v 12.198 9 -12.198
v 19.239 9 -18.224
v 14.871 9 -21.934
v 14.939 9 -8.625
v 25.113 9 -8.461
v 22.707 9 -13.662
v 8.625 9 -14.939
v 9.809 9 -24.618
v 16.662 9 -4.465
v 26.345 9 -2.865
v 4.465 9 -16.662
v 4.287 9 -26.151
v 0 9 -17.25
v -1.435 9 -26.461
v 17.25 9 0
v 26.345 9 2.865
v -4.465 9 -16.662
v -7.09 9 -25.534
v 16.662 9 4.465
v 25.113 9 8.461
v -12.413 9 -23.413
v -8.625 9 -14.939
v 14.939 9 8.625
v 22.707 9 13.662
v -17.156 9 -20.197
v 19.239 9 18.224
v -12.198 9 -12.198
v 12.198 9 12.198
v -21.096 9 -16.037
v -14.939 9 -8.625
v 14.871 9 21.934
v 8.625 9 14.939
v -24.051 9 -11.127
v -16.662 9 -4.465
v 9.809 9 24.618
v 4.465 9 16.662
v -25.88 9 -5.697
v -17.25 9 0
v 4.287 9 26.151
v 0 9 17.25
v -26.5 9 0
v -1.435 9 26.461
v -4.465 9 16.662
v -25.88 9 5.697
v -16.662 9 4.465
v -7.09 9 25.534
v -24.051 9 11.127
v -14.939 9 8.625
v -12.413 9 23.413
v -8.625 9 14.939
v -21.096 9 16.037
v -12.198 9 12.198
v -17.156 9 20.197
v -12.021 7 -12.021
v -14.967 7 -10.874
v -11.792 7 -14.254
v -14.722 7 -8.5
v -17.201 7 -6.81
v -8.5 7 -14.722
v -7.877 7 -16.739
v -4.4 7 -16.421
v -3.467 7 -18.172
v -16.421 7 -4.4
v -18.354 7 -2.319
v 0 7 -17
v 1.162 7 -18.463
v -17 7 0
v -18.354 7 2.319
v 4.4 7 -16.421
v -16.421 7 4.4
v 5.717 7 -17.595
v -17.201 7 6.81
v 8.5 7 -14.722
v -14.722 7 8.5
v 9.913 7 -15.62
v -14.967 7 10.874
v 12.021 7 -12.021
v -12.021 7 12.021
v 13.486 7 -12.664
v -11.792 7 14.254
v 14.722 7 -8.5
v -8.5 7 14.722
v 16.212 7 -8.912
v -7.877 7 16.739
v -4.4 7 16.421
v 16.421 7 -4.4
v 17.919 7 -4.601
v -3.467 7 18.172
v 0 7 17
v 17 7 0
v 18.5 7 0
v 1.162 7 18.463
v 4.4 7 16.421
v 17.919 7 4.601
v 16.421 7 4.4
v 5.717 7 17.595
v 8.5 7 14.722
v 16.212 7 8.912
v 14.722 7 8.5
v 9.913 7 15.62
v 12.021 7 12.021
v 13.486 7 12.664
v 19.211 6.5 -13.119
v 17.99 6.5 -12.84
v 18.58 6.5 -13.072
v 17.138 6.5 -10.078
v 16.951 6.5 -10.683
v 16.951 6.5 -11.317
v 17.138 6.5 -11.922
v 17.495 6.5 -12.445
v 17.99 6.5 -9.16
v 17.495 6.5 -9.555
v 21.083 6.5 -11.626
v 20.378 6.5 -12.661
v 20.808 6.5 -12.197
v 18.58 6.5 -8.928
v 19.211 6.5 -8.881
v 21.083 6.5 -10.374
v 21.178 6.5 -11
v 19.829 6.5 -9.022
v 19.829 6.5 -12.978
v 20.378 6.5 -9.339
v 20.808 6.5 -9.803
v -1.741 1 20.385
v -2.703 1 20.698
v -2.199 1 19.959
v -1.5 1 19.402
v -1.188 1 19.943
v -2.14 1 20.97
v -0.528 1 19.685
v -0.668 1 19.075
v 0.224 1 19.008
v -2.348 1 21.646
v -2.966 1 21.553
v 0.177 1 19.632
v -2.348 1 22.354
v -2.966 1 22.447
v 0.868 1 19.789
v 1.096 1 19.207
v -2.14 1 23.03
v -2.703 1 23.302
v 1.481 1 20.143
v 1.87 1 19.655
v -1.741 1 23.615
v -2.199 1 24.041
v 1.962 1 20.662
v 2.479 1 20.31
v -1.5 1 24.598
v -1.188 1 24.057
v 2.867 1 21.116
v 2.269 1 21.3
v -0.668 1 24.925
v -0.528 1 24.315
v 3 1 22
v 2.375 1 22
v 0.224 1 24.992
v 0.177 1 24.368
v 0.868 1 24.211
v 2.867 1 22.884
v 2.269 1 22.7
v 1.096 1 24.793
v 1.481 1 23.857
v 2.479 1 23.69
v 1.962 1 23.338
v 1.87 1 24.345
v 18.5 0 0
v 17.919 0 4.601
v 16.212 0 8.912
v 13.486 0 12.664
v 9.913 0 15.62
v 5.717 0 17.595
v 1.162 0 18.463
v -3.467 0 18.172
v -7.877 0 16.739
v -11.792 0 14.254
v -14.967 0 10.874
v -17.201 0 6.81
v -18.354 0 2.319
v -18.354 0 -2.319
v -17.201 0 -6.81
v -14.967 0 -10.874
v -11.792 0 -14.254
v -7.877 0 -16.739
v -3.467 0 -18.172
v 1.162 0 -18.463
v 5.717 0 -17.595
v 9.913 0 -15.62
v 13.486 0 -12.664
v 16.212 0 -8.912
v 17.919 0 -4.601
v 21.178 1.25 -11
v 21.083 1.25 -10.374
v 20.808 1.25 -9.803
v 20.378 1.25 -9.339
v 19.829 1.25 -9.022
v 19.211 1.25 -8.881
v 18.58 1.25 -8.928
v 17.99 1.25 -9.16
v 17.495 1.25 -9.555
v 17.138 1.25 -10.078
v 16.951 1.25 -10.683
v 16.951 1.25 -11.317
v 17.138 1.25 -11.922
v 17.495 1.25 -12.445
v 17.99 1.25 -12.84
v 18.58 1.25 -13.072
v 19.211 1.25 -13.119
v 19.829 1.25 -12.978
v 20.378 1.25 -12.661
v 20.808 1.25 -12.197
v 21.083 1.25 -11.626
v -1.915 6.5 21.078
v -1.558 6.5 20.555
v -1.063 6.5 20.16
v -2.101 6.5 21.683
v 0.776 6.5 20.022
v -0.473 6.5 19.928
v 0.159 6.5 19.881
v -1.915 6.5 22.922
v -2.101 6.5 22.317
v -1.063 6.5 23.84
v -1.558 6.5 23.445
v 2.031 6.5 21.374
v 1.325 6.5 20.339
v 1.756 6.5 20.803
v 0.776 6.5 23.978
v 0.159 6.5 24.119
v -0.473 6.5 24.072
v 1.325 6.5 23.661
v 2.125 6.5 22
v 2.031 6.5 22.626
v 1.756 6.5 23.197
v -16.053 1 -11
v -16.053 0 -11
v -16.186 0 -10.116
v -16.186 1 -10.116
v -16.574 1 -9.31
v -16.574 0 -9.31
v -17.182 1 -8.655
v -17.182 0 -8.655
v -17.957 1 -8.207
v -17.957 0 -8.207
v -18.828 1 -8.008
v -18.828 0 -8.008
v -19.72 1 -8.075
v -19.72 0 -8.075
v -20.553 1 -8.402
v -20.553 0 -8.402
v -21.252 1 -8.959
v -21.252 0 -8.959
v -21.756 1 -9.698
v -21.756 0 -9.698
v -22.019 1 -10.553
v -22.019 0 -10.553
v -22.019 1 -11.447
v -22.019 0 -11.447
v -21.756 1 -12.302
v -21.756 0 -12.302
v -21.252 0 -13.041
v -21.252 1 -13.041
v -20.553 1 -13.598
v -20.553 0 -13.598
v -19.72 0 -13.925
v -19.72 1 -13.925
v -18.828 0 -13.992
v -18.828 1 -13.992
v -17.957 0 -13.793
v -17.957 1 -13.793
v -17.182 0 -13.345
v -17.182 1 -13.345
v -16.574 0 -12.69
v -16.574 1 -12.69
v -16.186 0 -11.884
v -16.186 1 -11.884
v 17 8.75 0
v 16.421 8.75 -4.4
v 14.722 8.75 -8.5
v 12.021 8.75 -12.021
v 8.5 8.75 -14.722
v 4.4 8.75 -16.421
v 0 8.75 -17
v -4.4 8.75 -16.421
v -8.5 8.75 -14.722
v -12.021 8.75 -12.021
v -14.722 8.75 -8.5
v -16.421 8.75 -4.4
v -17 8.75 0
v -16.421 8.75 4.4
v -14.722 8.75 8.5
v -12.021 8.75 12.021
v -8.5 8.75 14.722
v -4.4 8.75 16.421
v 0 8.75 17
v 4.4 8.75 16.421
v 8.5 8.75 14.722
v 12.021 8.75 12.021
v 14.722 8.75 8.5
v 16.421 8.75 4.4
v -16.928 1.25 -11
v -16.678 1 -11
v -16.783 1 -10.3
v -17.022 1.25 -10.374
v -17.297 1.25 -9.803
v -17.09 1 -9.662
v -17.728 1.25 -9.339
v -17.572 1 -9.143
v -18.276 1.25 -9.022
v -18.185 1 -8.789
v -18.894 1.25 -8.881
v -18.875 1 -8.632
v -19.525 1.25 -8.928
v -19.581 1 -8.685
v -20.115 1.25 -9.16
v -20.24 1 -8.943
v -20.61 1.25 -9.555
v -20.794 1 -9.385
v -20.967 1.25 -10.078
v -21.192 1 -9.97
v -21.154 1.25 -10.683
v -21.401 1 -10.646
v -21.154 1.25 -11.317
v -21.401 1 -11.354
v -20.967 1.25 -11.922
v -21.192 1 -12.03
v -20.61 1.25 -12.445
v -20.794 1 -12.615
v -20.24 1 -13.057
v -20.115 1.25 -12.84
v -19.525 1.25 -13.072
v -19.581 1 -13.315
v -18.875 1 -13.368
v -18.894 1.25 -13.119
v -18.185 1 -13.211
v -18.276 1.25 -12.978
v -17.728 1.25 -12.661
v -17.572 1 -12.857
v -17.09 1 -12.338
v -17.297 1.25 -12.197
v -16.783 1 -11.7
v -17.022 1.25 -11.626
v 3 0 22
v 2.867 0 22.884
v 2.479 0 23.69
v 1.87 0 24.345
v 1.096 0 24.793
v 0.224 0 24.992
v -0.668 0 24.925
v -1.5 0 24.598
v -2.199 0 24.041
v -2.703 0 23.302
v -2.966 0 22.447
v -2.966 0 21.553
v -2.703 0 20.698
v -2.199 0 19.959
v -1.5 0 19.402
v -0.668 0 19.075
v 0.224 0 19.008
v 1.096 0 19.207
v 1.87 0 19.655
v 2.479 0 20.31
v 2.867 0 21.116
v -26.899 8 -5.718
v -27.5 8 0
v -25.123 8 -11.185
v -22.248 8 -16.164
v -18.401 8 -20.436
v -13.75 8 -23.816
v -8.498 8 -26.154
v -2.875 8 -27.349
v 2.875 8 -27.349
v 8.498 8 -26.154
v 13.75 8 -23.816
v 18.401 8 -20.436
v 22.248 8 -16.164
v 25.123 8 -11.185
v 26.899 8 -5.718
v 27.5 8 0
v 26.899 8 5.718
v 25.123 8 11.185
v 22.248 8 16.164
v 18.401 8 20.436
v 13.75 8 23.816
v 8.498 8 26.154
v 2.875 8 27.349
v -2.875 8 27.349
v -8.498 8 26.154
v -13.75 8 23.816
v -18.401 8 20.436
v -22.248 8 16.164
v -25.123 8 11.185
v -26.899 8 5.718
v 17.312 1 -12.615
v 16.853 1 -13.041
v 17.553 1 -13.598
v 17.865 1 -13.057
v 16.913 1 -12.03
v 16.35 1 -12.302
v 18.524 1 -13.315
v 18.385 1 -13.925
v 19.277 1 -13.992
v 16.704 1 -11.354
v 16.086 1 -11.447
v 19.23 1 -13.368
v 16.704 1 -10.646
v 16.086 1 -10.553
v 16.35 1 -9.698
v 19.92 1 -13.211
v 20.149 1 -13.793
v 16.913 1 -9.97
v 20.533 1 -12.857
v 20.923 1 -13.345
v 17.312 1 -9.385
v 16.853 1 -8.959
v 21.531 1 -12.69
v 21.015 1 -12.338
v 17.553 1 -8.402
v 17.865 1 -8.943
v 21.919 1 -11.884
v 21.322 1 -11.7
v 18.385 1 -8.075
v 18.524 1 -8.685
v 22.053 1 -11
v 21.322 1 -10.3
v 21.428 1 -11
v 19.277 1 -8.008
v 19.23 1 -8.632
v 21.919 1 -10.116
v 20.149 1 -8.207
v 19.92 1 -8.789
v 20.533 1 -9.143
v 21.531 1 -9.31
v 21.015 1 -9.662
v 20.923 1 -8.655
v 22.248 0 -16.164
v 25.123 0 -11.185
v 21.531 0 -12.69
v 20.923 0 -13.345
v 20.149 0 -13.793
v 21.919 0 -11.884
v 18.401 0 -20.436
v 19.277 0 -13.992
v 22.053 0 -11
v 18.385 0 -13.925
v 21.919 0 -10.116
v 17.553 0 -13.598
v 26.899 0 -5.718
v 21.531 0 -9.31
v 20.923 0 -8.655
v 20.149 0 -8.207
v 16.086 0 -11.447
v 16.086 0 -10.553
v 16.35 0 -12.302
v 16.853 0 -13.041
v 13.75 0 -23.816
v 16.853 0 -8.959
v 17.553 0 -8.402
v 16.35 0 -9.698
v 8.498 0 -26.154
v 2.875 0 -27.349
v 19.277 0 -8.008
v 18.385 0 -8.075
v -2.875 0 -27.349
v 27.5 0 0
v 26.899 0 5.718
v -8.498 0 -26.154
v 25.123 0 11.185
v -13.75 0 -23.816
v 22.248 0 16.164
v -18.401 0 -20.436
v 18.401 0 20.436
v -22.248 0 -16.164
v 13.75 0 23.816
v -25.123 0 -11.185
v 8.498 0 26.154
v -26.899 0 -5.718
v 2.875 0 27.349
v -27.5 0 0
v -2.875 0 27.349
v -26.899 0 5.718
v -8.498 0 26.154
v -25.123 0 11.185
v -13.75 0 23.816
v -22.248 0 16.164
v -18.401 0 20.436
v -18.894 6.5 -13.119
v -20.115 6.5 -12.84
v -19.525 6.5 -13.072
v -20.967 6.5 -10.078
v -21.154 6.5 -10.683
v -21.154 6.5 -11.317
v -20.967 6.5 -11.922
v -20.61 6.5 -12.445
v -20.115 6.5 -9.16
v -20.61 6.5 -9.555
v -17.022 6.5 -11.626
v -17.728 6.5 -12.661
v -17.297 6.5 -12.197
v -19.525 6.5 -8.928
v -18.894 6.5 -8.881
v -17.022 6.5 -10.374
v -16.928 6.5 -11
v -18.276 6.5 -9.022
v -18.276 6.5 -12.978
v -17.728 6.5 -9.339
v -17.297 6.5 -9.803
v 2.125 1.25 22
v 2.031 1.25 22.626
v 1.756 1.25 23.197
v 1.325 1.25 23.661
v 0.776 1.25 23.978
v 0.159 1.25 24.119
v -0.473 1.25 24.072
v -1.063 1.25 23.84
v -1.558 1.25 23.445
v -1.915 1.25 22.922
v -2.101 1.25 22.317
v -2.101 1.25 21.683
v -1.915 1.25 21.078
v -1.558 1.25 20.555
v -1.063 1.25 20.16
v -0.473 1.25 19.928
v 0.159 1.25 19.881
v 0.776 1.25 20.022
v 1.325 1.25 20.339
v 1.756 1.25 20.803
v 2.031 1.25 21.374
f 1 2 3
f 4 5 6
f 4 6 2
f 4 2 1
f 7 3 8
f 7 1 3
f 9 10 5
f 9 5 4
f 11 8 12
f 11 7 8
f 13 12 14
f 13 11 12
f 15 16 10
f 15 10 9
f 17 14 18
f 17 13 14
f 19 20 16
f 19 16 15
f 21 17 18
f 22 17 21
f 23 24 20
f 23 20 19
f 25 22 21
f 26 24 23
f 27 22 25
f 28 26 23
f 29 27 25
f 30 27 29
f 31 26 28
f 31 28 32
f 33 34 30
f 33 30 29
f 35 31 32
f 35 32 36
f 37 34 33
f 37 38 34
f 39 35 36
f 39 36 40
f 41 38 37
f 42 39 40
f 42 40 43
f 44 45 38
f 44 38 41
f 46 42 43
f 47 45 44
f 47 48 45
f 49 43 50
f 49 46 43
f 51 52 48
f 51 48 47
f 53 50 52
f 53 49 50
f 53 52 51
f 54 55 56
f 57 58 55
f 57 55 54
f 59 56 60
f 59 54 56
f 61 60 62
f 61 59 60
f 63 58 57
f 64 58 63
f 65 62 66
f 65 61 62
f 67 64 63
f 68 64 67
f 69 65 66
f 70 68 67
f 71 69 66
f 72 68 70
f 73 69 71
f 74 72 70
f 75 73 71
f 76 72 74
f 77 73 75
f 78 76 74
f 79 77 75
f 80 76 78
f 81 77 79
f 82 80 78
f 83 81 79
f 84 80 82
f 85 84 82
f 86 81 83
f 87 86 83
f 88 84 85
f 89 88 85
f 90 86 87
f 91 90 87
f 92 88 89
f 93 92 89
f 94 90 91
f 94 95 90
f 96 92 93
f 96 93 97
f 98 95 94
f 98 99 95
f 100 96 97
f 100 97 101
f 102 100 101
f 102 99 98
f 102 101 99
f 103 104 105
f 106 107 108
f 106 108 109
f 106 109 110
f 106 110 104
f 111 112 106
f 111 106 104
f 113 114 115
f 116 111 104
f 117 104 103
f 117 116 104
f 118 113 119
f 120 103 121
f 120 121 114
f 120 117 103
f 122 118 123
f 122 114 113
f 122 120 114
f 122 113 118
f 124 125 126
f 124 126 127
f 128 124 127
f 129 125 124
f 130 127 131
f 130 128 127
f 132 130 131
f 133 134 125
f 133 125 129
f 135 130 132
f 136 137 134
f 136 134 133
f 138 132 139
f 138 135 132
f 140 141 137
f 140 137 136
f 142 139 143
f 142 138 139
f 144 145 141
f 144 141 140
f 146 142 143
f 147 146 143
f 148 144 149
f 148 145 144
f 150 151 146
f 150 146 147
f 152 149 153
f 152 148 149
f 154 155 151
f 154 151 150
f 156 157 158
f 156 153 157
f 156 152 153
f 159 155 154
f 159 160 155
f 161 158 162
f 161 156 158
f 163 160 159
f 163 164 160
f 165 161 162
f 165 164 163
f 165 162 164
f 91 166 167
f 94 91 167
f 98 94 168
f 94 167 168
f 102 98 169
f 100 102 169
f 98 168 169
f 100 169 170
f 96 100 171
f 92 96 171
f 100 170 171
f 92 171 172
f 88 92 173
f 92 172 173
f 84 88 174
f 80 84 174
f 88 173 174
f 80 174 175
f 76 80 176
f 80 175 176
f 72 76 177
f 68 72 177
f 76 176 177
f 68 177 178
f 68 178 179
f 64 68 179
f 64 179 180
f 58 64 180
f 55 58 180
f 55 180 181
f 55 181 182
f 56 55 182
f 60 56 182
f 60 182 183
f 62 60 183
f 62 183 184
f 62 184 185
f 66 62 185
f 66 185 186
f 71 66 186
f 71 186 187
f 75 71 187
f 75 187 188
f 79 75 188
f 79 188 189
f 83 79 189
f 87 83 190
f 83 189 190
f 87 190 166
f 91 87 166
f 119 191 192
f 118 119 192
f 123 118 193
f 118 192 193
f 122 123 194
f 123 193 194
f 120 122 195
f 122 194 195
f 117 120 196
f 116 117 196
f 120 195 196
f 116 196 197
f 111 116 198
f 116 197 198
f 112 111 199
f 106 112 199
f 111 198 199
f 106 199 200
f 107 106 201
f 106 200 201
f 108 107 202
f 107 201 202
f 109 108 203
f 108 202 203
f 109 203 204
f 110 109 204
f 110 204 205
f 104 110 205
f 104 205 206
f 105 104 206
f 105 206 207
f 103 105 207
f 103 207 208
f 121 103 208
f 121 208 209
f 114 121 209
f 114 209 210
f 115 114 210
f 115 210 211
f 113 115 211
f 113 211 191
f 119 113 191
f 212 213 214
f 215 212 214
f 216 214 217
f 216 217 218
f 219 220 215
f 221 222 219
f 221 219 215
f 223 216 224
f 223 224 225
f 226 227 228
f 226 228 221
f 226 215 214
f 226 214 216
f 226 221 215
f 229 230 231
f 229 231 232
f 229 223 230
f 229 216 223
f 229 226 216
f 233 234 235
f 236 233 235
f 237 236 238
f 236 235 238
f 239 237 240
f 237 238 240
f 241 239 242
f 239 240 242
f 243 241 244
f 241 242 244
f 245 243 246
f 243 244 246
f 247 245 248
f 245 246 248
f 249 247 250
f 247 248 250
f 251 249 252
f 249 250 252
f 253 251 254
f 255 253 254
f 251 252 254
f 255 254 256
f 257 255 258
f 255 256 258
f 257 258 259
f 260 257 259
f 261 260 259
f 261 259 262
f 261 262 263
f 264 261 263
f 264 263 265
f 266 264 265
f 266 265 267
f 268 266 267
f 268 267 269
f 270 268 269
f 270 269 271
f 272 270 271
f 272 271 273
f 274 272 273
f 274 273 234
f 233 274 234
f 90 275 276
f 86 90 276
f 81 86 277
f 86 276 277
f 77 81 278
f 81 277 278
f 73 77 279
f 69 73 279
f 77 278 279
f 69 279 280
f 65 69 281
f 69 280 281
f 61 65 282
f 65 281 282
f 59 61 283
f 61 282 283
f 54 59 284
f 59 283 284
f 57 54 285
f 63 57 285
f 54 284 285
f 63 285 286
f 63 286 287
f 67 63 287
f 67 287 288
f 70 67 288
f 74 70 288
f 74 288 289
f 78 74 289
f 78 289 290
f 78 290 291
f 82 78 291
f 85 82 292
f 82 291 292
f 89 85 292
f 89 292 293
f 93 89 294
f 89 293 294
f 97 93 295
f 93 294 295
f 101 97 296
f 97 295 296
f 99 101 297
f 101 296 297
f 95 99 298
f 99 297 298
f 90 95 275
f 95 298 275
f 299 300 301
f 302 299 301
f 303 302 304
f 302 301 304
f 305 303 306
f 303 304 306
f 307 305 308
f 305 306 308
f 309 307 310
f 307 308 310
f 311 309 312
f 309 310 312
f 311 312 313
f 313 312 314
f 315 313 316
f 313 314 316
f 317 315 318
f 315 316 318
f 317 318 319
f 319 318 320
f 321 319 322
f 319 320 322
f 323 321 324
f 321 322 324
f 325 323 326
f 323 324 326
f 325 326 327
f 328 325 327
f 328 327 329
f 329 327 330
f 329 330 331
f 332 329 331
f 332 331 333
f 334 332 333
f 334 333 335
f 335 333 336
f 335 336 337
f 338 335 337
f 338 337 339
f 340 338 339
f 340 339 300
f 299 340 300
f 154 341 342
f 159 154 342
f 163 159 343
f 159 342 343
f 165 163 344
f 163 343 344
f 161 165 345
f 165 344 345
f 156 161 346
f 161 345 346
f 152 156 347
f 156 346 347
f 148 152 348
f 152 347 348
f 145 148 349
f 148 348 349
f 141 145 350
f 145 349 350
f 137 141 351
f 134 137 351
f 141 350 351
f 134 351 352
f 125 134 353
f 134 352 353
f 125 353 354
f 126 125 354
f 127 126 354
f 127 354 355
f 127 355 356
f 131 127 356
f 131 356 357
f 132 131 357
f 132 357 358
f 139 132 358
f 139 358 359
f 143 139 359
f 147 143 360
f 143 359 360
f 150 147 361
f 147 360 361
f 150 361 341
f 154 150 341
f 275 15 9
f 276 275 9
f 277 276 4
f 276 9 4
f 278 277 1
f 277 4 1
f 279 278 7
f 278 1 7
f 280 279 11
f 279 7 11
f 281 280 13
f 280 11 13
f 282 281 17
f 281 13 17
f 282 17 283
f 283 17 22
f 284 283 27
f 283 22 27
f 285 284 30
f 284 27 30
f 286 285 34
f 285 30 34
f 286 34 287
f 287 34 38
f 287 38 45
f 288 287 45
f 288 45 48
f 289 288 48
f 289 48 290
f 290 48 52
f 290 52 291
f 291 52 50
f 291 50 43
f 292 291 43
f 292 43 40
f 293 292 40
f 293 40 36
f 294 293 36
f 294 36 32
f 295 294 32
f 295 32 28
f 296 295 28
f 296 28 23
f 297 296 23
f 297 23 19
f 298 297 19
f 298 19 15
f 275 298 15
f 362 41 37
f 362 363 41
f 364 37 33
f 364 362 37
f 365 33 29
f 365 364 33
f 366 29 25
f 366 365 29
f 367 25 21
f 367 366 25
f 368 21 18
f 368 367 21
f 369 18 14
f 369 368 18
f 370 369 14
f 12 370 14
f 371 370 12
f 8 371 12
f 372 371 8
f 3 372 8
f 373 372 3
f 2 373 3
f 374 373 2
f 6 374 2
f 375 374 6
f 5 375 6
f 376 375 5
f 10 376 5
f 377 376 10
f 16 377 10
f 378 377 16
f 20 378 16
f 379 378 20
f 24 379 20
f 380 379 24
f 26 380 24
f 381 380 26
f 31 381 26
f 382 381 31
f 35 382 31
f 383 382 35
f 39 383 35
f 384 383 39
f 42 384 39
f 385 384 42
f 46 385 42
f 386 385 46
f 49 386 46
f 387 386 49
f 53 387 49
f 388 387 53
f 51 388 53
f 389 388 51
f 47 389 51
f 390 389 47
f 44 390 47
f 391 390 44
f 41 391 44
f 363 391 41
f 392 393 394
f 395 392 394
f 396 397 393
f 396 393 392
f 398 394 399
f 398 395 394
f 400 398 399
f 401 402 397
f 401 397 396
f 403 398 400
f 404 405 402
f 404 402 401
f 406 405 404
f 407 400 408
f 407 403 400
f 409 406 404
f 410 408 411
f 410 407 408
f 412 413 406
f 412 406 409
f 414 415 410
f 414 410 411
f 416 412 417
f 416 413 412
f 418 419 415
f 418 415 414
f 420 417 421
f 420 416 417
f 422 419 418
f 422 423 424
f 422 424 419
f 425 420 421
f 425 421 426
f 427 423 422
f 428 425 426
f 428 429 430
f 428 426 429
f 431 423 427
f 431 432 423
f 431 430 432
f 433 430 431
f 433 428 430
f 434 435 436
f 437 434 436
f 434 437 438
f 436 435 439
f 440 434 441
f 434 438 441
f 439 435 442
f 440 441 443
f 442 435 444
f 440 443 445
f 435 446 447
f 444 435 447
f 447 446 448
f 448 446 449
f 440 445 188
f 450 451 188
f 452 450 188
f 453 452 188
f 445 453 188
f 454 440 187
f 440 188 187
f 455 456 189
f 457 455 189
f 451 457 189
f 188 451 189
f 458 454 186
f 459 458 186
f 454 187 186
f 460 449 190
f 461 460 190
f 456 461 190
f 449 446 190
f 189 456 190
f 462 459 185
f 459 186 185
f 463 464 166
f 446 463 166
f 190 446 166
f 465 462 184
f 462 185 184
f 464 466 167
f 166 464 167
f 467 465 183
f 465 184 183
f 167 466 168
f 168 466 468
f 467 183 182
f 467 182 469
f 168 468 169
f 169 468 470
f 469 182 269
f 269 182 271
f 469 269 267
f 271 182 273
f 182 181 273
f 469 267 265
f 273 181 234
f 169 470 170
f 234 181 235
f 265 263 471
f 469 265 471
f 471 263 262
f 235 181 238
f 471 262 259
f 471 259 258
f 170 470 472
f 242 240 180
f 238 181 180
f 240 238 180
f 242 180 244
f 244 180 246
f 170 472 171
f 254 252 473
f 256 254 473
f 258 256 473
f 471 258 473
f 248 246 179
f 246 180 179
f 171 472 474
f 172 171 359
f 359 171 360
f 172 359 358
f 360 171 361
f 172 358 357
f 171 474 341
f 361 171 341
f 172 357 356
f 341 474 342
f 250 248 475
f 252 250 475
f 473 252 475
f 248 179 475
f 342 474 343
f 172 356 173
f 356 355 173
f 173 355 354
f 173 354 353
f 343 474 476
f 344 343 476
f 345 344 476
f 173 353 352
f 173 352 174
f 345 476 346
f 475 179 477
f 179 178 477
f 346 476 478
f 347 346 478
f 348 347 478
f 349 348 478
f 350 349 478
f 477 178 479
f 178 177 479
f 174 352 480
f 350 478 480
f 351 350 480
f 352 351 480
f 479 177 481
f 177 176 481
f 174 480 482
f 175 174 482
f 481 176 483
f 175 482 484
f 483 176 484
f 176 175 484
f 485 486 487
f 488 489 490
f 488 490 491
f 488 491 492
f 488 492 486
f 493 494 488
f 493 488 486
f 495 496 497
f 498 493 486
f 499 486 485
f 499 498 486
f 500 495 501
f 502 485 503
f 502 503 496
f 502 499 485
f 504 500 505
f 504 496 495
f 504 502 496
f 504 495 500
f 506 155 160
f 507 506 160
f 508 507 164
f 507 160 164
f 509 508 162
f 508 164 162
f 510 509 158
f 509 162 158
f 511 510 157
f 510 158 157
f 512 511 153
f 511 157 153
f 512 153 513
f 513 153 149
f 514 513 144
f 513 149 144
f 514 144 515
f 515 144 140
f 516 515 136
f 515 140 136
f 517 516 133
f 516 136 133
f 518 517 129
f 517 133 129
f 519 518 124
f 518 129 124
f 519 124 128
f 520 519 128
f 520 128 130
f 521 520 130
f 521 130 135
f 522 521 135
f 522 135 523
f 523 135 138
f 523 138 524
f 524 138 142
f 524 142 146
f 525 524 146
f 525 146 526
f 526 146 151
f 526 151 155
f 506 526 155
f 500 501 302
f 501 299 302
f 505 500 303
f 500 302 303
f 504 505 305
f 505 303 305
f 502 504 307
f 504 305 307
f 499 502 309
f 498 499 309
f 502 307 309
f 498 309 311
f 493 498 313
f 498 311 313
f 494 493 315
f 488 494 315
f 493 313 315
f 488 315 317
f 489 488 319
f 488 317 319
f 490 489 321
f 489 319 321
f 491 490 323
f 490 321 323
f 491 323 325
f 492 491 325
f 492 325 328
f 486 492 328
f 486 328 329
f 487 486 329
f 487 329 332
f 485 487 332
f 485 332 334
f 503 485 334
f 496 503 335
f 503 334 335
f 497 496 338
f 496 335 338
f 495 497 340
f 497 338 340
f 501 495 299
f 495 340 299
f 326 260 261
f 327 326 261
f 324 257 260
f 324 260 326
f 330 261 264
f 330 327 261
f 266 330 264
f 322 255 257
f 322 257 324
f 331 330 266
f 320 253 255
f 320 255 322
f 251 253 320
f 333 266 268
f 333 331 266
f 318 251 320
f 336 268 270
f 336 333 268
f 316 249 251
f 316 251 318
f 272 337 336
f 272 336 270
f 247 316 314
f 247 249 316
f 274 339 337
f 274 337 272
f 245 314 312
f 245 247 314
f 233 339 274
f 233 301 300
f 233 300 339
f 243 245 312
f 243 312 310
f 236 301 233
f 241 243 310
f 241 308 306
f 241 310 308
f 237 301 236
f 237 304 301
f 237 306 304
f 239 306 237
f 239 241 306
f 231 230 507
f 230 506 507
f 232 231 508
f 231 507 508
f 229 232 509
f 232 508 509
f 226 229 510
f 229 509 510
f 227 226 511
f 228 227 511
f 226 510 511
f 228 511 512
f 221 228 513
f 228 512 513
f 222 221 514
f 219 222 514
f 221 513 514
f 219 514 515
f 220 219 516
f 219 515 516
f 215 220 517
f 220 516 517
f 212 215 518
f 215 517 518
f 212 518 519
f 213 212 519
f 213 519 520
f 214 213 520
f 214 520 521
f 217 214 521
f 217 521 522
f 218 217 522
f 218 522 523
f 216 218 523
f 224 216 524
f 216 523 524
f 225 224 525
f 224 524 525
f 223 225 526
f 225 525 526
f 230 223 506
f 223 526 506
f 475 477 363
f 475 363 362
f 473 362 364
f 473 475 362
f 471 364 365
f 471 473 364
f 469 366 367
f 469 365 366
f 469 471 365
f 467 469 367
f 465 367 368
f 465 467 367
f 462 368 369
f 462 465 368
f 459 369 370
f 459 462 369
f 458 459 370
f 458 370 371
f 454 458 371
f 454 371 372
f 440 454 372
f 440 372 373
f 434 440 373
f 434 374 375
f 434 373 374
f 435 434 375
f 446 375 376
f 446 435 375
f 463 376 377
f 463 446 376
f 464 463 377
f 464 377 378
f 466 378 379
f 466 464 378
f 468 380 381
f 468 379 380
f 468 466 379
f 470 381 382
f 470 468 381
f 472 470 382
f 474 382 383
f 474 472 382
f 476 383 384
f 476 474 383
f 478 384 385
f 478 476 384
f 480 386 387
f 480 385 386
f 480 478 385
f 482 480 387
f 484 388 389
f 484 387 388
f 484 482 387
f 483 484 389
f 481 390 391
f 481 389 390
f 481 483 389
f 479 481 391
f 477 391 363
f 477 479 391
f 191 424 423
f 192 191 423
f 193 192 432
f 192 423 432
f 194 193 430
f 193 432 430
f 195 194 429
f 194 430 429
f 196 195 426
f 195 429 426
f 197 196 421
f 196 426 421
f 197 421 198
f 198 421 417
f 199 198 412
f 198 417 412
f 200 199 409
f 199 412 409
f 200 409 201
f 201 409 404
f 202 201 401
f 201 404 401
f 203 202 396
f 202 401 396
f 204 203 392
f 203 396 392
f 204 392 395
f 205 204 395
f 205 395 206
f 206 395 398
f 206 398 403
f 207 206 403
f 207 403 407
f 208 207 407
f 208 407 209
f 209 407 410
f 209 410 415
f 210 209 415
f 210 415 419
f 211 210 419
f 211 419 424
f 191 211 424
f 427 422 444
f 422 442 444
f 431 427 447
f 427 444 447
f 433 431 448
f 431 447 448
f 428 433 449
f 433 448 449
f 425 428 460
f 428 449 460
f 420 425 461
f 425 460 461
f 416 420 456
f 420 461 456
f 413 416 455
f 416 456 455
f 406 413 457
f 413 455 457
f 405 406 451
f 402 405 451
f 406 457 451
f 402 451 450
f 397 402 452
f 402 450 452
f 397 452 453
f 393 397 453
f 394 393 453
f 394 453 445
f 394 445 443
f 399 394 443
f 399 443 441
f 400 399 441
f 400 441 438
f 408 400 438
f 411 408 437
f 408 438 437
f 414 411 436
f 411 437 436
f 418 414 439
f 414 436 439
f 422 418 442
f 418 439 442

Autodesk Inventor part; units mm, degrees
ref_plane "YZ Plane" through (0, 0, 0) normal (1, 0, 0) x (0, 1, 0)
ref_plane "XZ Plane" through (0, 0, 0) normal (0, 1, 0) x (-1, 0, 0)
ref_plane "XY Plane" through (0, 0, 0) normal (0, 0, 1) x (1, 0, 0)
sketch "Sketch1" plane through (0, 0, 0) normal (0, 1, 0) x (-1, 0, 0)
  circle A0 centre (0, 0) radius 27.5
  dimension "d0" = 55
extrude "Extrusion1" add sketch "Sketch1" along normal blind 9
sketch "Sketch2" plane through (0, 9, 0) normal (0, 1, 0) x (1, 0, 0)
  circle A0 centre (0, 0) radius 17
  dimension "d3" = 34
extrude "Extrusion2" cut sketch "Sketch2" against normal through all
sketch "Sketch3" plane through (0, 0, 0) normal (0, -1, 0) x (1, 0, 0)
  circle A0 centre (0, 0) radius 18.5
  dimension "d6" = 37
extrude "Extrusion3" cut sketch "Sketch3" against normal blind 7
chamfer "Chamfer1" distance 1 angle 45 1 edges at (27.5, 9, 0)
sketch "Sketch4" plane through (0, 0, 0) normal (0, -1, 0) x (1, 0, 0)
  line L0 (0, 0) -> (0, 22)
  circle A0 centre (0, 22) radius 2.125
  circle A1 centre (-19.0526, -11) radius 2.125
  circle A2 centre (19.0526, -11) radius 2.125
  dimension "d12" = 22
  dimension "d13" = 4.25
  dimension "d16" = 360
extrude "Extrusion4" cut sketch "Sketch4" against normal blind 6.5
chamfer "Chamfer3" distance 0.25 angle 45 1 edges at (-17, 9, 0)
sketch "Sketch5" plane through (0, 0, 0) normal (0, -1, 0) x (1, 0, 0)
  circle A0 centre (0, 22) radius 2.125 projected
  circle A1 centre (0, 22) radius 3
  circle A2 centre (19.0526, -11) radius 2.125 projected
  circle A3 centre (19.0526, -11) radius 3
  circle A4 centre (-19.0526, -11) radius 2.125 projected
  circle A5 centre (-19.0526, -11) radius 3
  point P0 (0, 0)
  dimension "d26" = 6
  dimension "d27" = 6
  dimension "d28" = 6
extrude "Extrusion5" cut sketch "Sketch5" against normal blind 1 contours A1 | A2 | A3 | A4 | A5
chamfer "Chamfer7" distance 0.25 angle 45 3 edges at (-2.125, 1, 22) (16.9276, 1, -11) (-21.1776, 1, -11)
properties part number "Bearing_Holder" material "ABS Plastic"
